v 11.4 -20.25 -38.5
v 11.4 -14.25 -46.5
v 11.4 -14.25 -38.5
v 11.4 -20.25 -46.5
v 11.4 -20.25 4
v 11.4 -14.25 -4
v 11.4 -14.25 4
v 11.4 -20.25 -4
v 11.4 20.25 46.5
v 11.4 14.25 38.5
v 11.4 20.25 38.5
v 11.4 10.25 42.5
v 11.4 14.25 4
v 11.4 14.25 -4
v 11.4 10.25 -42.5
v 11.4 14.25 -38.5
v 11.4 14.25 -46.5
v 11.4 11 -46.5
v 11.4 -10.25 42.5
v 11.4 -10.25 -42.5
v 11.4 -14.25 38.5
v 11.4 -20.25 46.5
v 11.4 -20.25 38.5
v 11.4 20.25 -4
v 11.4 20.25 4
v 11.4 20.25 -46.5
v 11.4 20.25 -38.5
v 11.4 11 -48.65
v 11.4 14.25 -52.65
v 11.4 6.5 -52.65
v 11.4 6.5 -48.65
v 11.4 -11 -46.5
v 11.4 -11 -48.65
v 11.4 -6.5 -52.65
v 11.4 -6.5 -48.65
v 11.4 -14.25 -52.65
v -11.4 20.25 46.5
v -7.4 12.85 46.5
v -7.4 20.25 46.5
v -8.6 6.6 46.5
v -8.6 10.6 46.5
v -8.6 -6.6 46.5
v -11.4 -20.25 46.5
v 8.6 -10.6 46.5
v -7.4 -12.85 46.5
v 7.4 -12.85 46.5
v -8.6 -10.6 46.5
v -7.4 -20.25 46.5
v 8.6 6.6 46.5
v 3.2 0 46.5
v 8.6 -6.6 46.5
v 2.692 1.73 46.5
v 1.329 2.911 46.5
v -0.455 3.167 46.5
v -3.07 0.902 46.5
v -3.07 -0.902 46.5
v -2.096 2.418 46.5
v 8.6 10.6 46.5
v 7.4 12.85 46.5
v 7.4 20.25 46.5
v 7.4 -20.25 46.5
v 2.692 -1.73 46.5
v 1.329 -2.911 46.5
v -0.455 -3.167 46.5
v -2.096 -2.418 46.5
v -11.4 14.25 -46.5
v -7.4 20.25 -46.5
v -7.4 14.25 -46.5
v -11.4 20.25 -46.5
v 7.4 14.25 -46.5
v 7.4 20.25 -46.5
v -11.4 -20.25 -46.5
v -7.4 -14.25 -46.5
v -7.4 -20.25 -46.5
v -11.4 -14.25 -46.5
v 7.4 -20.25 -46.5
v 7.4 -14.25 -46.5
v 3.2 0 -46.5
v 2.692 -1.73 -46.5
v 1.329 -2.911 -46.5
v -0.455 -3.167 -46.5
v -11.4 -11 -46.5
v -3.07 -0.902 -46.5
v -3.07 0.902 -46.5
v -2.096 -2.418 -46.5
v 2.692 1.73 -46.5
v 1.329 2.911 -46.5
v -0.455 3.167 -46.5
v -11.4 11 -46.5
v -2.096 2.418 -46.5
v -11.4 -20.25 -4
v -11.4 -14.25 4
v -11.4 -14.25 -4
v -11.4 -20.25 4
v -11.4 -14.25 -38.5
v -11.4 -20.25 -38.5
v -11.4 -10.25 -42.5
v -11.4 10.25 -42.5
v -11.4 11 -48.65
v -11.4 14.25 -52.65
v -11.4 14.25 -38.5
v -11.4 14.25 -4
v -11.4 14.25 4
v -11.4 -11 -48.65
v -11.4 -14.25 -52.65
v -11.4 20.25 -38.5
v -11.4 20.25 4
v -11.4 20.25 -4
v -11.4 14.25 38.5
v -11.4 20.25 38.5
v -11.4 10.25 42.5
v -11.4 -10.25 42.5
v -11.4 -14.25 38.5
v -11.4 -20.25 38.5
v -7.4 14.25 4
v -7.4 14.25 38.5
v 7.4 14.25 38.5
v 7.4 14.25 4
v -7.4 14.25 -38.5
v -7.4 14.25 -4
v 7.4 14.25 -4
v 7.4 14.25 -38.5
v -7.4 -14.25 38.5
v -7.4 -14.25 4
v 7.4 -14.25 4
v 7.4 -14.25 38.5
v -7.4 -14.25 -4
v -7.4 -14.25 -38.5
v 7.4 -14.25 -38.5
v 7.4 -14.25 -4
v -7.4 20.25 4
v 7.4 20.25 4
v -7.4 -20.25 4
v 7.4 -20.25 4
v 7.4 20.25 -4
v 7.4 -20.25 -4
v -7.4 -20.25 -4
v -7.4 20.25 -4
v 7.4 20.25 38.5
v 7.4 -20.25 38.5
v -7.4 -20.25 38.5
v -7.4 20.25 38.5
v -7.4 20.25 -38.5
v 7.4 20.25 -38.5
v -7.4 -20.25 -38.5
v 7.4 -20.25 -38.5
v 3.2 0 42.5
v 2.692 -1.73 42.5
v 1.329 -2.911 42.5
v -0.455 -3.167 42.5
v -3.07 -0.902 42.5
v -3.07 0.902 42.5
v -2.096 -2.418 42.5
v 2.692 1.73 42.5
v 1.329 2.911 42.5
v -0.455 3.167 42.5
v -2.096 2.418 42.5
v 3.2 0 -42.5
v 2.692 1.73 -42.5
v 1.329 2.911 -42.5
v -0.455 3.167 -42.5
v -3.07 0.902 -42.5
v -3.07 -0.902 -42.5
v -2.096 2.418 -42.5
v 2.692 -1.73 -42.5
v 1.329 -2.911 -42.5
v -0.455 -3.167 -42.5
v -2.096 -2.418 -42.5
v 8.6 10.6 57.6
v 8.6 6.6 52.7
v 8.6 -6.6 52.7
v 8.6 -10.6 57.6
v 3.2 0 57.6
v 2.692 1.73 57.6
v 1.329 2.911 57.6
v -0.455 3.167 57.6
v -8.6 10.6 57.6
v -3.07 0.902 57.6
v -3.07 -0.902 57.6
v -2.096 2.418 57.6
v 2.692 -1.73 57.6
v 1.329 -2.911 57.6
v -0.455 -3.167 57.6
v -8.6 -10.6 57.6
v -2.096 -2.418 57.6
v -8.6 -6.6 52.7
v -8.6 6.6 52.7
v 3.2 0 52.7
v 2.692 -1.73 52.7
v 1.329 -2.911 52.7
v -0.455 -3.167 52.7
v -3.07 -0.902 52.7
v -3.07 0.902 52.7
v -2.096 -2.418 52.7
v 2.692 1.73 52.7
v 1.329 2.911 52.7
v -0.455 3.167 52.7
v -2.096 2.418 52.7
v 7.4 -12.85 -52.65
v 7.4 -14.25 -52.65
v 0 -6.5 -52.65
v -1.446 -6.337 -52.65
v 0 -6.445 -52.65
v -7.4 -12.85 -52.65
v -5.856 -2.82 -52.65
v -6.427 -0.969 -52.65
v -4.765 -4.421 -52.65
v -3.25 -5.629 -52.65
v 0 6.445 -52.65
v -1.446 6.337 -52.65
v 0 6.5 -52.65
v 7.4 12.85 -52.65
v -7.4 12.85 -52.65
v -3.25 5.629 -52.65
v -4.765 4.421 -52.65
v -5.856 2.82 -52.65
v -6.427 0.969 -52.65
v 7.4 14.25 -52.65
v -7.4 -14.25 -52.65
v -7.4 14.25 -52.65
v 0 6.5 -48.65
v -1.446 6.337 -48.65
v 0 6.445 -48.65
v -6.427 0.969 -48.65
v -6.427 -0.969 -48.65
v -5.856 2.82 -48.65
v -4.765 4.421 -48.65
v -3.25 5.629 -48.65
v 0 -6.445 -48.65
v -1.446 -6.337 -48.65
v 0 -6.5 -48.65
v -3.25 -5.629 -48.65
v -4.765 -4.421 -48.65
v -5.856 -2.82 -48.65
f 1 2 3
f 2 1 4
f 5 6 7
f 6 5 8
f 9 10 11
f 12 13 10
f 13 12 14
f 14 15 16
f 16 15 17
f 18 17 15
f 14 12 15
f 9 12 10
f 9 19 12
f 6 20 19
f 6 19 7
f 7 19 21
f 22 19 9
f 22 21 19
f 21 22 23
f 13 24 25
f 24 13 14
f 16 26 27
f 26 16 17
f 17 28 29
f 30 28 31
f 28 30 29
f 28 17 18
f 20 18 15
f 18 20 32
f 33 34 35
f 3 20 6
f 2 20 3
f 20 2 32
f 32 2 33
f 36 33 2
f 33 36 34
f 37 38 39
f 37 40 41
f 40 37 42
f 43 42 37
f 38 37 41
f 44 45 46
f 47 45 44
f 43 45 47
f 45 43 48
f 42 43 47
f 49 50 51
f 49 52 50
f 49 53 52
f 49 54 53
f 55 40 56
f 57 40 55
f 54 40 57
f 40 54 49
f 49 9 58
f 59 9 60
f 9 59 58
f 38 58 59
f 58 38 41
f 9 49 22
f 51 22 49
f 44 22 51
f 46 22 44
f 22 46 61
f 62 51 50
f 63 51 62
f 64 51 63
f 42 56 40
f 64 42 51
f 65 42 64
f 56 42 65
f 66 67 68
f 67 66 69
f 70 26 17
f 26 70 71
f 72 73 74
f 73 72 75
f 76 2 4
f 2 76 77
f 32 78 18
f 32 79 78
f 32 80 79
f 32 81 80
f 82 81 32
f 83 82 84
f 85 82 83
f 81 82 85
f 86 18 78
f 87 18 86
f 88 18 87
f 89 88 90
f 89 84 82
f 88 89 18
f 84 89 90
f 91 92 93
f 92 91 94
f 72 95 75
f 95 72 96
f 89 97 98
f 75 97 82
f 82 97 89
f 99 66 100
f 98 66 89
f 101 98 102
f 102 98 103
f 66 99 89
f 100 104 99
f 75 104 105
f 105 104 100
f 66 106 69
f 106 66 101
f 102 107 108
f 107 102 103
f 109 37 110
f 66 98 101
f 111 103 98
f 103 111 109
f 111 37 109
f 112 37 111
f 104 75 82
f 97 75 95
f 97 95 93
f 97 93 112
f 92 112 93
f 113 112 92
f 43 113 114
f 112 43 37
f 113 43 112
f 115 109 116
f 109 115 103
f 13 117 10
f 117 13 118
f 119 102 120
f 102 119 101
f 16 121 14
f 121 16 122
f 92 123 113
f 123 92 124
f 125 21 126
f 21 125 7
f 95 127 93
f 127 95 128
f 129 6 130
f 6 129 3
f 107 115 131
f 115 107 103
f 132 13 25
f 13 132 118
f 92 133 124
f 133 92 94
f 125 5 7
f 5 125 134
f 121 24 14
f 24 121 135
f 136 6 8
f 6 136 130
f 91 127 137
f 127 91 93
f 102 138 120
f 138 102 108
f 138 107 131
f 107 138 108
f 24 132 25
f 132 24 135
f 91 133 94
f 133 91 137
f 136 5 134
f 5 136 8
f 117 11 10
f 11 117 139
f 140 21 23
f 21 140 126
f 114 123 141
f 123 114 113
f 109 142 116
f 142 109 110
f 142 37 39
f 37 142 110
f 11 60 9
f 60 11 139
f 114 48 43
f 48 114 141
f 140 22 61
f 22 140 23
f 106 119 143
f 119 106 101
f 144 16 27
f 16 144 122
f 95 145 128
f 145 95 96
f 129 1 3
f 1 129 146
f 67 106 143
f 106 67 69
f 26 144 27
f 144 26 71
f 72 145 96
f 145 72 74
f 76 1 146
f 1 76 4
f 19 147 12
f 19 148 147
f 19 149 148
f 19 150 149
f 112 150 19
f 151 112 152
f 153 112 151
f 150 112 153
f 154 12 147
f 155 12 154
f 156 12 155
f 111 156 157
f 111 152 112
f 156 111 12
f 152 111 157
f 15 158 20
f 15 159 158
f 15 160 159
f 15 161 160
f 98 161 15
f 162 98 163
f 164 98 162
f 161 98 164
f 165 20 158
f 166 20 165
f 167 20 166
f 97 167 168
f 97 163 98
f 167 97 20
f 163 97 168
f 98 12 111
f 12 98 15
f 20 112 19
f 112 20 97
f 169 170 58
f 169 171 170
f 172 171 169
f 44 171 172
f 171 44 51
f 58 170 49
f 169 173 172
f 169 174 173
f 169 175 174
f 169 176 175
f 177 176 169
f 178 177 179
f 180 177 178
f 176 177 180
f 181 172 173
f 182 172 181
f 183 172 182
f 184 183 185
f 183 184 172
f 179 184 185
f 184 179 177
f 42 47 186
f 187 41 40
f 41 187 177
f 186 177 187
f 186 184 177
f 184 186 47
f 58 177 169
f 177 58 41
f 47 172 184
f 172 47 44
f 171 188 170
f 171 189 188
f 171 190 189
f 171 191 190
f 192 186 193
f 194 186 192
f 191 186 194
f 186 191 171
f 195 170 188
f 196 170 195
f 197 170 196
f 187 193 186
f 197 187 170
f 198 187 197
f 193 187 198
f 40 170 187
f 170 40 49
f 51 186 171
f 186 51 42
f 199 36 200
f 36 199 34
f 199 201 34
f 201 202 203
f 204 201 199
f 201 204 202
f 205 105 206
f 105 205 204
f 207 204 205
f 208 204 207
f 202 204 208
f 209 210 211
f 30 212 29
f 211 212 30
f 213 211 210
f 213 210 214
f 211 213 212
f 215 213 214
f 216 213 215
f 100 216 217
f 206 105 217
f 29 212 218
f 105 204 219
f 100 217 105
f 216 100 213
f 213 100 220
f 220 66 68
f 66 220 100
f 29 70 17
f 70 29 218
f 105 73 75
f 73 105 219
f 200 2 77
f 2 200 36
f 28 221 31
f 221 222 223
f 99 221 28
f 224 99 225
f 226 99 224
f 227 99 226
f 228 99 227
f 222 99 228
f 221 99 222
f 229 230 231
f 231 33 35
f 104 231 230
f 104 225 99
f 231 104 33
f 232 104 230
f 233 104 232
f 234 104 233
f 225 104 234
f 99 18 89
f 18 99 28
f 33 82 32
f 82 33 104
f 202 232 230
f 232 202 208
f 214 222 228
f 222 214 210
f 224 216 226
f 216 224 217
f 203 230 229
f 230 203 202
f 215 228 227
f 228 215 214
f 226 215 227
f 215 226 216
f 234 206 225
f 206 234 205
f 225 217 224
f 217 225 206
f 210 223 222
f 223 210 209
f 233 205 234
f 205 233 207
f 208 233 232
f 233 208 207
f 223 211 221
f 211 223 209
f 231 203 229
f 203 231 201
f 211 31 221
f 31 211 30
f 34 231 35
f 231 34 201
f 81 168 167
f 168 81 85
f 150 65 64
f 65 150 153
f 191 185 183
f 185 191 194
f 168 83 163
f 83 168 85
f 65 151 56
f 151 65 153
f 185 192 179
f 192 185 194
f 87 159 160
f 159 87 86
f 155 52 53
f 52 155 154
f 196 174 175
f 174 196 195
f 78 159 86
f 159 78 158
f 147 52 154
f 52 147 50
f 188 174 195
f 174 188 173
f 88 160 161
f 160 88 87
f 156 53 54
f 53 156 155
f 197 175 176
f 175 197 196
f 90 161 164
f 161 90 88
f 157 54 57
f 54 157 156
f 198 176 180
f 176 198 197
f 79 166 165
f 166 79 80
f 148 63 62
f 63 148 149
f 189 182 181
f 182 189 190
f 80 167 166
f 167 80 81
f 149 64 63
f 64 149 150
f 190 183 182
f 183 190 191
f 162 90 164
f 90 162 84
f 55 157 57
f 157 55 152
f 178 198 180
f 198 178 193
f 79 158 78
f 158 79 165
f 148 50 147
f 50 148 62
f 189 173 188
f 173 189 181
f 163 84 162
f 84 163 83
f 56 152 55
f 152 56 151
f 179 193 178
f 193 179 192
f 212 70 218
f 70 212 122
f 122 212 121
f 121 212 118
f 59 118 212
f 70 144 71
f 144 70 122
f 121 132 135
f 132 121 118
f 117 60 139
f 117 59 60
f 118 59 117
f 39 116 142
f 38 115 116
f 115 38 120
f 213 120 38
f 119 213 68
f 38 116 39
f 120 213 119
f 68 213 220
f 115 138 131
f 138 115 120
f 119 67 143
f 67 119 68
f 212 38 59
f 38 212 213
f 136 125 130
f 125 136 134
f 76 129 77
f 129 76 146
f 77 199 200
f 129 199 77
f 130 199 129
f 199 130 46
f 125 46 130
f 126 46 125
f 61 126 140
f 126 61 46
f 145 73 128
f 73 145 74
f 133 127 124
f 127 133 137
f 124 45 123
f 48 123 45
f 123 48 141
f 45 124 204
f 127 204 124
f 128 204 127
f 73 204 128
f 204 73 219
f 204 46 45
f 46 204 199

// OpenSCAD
plungerTravel = 85;
extrusionThickness = 14.8;
wallThickness = 4;
barrelTabsMin = 24.5;
screwRadius=3.2;

//plunger frame
plunger_frame_length=plungerTravel+2*wallThickness;
plunger_frame_width=barrelTabsMin+4;
plunger_frame_thickness=extrusionThickness+2*wallThickness;

nutAcross = 13.2;
nutDepth = 6.2;
nutBlockLength=nutDepth+2*wallThickness;
nutBlockWidth=nutAcross+2*wallThickness;
nutBlockHeight=nutAcross+wallThickness;
plungerEndDiameter=22.0;
plungerEndThickness=2.15;
plungerStemDiameter=13.0;

difference() {
	union() {
		//main frame
		difference() {
			union() {
				cube([plunger_frame_thickness,plunger_frame_width,plunger_frame_length],center=true); // main frame
				cube([extrusionThickness+2*wallThickness,barrelTabsMin+4*wallThickness,wallThickness*2],center=true);
				translate([0,0,plunger_frame_length/2-wallThickness])
					cube([extrusionThickness+2*wallThickness,barrelTabsMin+4*wallThickness,wallThickness*2],center=true);
				translate([0,0,-plunger_frame_length/2+wallThickness])
					cube([extrusionThickness+2*wallThickness,barrelTabsMin+4*wallThickness,wallThickness*2],center=true);
			}
			cube([2*plunger_frame_thickness,plunger_frame_width-wallThickness*2,plunger_frame_length-wallThickness*2],center=true);
		}
		
		//captive nut
		difference() {
			translate([0,0,plunger_frame_length/2+wallThickness]) // captive nut
				cube([nutBlockHeight,nutBlockWidth,nutBlockLength],center=true);
			translate([0,0,plunger_frame_length/2+nutDepth/2])
				cube([plunger_frame_thickness,nutAcross,nutDepth],center=true);
		}
		
		//plunger holder
		difference() {
			translate([0,0,-plunger_frame_length/2-(plungerEndThickness+wallThickness)/2]) // plunger 
				cube([plunger_frame_thickness,plunger_frame_width,plungerEndThickness+wallThickness],center=true);
			translate([0,0,-plunger_frame_length/2-plungerEndThickness/2])
				cube([plunger_frame_thickness*2,plungerEndDiameter,plungerEndThickness],center=true);
			translate([0,0,-wallThickness-plunger_frame_length/2])
				cylinder(wallThickness*2,d=plungerStemDiameter,center=true);
			translate([plungerStemDiameter/2,0,-wallThickness-plunger_frame_length/2])
				cube([plungerStemDiameter,plungerStemDiameter,wallThickness*2],center=true);
		}
	}
	//threaded rod
	cylinder(plunger_frame_length+40,screwRadius,screwRadius,center=true);
	//aluminum extrusions
	translate([0,barrelTabsMin/2+wallThickness*2,0])
		cube([extrusionThickness,extrusionThickness,plunger_frame_length*2],center=true);
	translate([0,-(barrelTabsMin/2+wallThickness*2),0])
		cube([extrusionThickness,extrusionThickness,plunger_frame_length*2],center=true);
}
